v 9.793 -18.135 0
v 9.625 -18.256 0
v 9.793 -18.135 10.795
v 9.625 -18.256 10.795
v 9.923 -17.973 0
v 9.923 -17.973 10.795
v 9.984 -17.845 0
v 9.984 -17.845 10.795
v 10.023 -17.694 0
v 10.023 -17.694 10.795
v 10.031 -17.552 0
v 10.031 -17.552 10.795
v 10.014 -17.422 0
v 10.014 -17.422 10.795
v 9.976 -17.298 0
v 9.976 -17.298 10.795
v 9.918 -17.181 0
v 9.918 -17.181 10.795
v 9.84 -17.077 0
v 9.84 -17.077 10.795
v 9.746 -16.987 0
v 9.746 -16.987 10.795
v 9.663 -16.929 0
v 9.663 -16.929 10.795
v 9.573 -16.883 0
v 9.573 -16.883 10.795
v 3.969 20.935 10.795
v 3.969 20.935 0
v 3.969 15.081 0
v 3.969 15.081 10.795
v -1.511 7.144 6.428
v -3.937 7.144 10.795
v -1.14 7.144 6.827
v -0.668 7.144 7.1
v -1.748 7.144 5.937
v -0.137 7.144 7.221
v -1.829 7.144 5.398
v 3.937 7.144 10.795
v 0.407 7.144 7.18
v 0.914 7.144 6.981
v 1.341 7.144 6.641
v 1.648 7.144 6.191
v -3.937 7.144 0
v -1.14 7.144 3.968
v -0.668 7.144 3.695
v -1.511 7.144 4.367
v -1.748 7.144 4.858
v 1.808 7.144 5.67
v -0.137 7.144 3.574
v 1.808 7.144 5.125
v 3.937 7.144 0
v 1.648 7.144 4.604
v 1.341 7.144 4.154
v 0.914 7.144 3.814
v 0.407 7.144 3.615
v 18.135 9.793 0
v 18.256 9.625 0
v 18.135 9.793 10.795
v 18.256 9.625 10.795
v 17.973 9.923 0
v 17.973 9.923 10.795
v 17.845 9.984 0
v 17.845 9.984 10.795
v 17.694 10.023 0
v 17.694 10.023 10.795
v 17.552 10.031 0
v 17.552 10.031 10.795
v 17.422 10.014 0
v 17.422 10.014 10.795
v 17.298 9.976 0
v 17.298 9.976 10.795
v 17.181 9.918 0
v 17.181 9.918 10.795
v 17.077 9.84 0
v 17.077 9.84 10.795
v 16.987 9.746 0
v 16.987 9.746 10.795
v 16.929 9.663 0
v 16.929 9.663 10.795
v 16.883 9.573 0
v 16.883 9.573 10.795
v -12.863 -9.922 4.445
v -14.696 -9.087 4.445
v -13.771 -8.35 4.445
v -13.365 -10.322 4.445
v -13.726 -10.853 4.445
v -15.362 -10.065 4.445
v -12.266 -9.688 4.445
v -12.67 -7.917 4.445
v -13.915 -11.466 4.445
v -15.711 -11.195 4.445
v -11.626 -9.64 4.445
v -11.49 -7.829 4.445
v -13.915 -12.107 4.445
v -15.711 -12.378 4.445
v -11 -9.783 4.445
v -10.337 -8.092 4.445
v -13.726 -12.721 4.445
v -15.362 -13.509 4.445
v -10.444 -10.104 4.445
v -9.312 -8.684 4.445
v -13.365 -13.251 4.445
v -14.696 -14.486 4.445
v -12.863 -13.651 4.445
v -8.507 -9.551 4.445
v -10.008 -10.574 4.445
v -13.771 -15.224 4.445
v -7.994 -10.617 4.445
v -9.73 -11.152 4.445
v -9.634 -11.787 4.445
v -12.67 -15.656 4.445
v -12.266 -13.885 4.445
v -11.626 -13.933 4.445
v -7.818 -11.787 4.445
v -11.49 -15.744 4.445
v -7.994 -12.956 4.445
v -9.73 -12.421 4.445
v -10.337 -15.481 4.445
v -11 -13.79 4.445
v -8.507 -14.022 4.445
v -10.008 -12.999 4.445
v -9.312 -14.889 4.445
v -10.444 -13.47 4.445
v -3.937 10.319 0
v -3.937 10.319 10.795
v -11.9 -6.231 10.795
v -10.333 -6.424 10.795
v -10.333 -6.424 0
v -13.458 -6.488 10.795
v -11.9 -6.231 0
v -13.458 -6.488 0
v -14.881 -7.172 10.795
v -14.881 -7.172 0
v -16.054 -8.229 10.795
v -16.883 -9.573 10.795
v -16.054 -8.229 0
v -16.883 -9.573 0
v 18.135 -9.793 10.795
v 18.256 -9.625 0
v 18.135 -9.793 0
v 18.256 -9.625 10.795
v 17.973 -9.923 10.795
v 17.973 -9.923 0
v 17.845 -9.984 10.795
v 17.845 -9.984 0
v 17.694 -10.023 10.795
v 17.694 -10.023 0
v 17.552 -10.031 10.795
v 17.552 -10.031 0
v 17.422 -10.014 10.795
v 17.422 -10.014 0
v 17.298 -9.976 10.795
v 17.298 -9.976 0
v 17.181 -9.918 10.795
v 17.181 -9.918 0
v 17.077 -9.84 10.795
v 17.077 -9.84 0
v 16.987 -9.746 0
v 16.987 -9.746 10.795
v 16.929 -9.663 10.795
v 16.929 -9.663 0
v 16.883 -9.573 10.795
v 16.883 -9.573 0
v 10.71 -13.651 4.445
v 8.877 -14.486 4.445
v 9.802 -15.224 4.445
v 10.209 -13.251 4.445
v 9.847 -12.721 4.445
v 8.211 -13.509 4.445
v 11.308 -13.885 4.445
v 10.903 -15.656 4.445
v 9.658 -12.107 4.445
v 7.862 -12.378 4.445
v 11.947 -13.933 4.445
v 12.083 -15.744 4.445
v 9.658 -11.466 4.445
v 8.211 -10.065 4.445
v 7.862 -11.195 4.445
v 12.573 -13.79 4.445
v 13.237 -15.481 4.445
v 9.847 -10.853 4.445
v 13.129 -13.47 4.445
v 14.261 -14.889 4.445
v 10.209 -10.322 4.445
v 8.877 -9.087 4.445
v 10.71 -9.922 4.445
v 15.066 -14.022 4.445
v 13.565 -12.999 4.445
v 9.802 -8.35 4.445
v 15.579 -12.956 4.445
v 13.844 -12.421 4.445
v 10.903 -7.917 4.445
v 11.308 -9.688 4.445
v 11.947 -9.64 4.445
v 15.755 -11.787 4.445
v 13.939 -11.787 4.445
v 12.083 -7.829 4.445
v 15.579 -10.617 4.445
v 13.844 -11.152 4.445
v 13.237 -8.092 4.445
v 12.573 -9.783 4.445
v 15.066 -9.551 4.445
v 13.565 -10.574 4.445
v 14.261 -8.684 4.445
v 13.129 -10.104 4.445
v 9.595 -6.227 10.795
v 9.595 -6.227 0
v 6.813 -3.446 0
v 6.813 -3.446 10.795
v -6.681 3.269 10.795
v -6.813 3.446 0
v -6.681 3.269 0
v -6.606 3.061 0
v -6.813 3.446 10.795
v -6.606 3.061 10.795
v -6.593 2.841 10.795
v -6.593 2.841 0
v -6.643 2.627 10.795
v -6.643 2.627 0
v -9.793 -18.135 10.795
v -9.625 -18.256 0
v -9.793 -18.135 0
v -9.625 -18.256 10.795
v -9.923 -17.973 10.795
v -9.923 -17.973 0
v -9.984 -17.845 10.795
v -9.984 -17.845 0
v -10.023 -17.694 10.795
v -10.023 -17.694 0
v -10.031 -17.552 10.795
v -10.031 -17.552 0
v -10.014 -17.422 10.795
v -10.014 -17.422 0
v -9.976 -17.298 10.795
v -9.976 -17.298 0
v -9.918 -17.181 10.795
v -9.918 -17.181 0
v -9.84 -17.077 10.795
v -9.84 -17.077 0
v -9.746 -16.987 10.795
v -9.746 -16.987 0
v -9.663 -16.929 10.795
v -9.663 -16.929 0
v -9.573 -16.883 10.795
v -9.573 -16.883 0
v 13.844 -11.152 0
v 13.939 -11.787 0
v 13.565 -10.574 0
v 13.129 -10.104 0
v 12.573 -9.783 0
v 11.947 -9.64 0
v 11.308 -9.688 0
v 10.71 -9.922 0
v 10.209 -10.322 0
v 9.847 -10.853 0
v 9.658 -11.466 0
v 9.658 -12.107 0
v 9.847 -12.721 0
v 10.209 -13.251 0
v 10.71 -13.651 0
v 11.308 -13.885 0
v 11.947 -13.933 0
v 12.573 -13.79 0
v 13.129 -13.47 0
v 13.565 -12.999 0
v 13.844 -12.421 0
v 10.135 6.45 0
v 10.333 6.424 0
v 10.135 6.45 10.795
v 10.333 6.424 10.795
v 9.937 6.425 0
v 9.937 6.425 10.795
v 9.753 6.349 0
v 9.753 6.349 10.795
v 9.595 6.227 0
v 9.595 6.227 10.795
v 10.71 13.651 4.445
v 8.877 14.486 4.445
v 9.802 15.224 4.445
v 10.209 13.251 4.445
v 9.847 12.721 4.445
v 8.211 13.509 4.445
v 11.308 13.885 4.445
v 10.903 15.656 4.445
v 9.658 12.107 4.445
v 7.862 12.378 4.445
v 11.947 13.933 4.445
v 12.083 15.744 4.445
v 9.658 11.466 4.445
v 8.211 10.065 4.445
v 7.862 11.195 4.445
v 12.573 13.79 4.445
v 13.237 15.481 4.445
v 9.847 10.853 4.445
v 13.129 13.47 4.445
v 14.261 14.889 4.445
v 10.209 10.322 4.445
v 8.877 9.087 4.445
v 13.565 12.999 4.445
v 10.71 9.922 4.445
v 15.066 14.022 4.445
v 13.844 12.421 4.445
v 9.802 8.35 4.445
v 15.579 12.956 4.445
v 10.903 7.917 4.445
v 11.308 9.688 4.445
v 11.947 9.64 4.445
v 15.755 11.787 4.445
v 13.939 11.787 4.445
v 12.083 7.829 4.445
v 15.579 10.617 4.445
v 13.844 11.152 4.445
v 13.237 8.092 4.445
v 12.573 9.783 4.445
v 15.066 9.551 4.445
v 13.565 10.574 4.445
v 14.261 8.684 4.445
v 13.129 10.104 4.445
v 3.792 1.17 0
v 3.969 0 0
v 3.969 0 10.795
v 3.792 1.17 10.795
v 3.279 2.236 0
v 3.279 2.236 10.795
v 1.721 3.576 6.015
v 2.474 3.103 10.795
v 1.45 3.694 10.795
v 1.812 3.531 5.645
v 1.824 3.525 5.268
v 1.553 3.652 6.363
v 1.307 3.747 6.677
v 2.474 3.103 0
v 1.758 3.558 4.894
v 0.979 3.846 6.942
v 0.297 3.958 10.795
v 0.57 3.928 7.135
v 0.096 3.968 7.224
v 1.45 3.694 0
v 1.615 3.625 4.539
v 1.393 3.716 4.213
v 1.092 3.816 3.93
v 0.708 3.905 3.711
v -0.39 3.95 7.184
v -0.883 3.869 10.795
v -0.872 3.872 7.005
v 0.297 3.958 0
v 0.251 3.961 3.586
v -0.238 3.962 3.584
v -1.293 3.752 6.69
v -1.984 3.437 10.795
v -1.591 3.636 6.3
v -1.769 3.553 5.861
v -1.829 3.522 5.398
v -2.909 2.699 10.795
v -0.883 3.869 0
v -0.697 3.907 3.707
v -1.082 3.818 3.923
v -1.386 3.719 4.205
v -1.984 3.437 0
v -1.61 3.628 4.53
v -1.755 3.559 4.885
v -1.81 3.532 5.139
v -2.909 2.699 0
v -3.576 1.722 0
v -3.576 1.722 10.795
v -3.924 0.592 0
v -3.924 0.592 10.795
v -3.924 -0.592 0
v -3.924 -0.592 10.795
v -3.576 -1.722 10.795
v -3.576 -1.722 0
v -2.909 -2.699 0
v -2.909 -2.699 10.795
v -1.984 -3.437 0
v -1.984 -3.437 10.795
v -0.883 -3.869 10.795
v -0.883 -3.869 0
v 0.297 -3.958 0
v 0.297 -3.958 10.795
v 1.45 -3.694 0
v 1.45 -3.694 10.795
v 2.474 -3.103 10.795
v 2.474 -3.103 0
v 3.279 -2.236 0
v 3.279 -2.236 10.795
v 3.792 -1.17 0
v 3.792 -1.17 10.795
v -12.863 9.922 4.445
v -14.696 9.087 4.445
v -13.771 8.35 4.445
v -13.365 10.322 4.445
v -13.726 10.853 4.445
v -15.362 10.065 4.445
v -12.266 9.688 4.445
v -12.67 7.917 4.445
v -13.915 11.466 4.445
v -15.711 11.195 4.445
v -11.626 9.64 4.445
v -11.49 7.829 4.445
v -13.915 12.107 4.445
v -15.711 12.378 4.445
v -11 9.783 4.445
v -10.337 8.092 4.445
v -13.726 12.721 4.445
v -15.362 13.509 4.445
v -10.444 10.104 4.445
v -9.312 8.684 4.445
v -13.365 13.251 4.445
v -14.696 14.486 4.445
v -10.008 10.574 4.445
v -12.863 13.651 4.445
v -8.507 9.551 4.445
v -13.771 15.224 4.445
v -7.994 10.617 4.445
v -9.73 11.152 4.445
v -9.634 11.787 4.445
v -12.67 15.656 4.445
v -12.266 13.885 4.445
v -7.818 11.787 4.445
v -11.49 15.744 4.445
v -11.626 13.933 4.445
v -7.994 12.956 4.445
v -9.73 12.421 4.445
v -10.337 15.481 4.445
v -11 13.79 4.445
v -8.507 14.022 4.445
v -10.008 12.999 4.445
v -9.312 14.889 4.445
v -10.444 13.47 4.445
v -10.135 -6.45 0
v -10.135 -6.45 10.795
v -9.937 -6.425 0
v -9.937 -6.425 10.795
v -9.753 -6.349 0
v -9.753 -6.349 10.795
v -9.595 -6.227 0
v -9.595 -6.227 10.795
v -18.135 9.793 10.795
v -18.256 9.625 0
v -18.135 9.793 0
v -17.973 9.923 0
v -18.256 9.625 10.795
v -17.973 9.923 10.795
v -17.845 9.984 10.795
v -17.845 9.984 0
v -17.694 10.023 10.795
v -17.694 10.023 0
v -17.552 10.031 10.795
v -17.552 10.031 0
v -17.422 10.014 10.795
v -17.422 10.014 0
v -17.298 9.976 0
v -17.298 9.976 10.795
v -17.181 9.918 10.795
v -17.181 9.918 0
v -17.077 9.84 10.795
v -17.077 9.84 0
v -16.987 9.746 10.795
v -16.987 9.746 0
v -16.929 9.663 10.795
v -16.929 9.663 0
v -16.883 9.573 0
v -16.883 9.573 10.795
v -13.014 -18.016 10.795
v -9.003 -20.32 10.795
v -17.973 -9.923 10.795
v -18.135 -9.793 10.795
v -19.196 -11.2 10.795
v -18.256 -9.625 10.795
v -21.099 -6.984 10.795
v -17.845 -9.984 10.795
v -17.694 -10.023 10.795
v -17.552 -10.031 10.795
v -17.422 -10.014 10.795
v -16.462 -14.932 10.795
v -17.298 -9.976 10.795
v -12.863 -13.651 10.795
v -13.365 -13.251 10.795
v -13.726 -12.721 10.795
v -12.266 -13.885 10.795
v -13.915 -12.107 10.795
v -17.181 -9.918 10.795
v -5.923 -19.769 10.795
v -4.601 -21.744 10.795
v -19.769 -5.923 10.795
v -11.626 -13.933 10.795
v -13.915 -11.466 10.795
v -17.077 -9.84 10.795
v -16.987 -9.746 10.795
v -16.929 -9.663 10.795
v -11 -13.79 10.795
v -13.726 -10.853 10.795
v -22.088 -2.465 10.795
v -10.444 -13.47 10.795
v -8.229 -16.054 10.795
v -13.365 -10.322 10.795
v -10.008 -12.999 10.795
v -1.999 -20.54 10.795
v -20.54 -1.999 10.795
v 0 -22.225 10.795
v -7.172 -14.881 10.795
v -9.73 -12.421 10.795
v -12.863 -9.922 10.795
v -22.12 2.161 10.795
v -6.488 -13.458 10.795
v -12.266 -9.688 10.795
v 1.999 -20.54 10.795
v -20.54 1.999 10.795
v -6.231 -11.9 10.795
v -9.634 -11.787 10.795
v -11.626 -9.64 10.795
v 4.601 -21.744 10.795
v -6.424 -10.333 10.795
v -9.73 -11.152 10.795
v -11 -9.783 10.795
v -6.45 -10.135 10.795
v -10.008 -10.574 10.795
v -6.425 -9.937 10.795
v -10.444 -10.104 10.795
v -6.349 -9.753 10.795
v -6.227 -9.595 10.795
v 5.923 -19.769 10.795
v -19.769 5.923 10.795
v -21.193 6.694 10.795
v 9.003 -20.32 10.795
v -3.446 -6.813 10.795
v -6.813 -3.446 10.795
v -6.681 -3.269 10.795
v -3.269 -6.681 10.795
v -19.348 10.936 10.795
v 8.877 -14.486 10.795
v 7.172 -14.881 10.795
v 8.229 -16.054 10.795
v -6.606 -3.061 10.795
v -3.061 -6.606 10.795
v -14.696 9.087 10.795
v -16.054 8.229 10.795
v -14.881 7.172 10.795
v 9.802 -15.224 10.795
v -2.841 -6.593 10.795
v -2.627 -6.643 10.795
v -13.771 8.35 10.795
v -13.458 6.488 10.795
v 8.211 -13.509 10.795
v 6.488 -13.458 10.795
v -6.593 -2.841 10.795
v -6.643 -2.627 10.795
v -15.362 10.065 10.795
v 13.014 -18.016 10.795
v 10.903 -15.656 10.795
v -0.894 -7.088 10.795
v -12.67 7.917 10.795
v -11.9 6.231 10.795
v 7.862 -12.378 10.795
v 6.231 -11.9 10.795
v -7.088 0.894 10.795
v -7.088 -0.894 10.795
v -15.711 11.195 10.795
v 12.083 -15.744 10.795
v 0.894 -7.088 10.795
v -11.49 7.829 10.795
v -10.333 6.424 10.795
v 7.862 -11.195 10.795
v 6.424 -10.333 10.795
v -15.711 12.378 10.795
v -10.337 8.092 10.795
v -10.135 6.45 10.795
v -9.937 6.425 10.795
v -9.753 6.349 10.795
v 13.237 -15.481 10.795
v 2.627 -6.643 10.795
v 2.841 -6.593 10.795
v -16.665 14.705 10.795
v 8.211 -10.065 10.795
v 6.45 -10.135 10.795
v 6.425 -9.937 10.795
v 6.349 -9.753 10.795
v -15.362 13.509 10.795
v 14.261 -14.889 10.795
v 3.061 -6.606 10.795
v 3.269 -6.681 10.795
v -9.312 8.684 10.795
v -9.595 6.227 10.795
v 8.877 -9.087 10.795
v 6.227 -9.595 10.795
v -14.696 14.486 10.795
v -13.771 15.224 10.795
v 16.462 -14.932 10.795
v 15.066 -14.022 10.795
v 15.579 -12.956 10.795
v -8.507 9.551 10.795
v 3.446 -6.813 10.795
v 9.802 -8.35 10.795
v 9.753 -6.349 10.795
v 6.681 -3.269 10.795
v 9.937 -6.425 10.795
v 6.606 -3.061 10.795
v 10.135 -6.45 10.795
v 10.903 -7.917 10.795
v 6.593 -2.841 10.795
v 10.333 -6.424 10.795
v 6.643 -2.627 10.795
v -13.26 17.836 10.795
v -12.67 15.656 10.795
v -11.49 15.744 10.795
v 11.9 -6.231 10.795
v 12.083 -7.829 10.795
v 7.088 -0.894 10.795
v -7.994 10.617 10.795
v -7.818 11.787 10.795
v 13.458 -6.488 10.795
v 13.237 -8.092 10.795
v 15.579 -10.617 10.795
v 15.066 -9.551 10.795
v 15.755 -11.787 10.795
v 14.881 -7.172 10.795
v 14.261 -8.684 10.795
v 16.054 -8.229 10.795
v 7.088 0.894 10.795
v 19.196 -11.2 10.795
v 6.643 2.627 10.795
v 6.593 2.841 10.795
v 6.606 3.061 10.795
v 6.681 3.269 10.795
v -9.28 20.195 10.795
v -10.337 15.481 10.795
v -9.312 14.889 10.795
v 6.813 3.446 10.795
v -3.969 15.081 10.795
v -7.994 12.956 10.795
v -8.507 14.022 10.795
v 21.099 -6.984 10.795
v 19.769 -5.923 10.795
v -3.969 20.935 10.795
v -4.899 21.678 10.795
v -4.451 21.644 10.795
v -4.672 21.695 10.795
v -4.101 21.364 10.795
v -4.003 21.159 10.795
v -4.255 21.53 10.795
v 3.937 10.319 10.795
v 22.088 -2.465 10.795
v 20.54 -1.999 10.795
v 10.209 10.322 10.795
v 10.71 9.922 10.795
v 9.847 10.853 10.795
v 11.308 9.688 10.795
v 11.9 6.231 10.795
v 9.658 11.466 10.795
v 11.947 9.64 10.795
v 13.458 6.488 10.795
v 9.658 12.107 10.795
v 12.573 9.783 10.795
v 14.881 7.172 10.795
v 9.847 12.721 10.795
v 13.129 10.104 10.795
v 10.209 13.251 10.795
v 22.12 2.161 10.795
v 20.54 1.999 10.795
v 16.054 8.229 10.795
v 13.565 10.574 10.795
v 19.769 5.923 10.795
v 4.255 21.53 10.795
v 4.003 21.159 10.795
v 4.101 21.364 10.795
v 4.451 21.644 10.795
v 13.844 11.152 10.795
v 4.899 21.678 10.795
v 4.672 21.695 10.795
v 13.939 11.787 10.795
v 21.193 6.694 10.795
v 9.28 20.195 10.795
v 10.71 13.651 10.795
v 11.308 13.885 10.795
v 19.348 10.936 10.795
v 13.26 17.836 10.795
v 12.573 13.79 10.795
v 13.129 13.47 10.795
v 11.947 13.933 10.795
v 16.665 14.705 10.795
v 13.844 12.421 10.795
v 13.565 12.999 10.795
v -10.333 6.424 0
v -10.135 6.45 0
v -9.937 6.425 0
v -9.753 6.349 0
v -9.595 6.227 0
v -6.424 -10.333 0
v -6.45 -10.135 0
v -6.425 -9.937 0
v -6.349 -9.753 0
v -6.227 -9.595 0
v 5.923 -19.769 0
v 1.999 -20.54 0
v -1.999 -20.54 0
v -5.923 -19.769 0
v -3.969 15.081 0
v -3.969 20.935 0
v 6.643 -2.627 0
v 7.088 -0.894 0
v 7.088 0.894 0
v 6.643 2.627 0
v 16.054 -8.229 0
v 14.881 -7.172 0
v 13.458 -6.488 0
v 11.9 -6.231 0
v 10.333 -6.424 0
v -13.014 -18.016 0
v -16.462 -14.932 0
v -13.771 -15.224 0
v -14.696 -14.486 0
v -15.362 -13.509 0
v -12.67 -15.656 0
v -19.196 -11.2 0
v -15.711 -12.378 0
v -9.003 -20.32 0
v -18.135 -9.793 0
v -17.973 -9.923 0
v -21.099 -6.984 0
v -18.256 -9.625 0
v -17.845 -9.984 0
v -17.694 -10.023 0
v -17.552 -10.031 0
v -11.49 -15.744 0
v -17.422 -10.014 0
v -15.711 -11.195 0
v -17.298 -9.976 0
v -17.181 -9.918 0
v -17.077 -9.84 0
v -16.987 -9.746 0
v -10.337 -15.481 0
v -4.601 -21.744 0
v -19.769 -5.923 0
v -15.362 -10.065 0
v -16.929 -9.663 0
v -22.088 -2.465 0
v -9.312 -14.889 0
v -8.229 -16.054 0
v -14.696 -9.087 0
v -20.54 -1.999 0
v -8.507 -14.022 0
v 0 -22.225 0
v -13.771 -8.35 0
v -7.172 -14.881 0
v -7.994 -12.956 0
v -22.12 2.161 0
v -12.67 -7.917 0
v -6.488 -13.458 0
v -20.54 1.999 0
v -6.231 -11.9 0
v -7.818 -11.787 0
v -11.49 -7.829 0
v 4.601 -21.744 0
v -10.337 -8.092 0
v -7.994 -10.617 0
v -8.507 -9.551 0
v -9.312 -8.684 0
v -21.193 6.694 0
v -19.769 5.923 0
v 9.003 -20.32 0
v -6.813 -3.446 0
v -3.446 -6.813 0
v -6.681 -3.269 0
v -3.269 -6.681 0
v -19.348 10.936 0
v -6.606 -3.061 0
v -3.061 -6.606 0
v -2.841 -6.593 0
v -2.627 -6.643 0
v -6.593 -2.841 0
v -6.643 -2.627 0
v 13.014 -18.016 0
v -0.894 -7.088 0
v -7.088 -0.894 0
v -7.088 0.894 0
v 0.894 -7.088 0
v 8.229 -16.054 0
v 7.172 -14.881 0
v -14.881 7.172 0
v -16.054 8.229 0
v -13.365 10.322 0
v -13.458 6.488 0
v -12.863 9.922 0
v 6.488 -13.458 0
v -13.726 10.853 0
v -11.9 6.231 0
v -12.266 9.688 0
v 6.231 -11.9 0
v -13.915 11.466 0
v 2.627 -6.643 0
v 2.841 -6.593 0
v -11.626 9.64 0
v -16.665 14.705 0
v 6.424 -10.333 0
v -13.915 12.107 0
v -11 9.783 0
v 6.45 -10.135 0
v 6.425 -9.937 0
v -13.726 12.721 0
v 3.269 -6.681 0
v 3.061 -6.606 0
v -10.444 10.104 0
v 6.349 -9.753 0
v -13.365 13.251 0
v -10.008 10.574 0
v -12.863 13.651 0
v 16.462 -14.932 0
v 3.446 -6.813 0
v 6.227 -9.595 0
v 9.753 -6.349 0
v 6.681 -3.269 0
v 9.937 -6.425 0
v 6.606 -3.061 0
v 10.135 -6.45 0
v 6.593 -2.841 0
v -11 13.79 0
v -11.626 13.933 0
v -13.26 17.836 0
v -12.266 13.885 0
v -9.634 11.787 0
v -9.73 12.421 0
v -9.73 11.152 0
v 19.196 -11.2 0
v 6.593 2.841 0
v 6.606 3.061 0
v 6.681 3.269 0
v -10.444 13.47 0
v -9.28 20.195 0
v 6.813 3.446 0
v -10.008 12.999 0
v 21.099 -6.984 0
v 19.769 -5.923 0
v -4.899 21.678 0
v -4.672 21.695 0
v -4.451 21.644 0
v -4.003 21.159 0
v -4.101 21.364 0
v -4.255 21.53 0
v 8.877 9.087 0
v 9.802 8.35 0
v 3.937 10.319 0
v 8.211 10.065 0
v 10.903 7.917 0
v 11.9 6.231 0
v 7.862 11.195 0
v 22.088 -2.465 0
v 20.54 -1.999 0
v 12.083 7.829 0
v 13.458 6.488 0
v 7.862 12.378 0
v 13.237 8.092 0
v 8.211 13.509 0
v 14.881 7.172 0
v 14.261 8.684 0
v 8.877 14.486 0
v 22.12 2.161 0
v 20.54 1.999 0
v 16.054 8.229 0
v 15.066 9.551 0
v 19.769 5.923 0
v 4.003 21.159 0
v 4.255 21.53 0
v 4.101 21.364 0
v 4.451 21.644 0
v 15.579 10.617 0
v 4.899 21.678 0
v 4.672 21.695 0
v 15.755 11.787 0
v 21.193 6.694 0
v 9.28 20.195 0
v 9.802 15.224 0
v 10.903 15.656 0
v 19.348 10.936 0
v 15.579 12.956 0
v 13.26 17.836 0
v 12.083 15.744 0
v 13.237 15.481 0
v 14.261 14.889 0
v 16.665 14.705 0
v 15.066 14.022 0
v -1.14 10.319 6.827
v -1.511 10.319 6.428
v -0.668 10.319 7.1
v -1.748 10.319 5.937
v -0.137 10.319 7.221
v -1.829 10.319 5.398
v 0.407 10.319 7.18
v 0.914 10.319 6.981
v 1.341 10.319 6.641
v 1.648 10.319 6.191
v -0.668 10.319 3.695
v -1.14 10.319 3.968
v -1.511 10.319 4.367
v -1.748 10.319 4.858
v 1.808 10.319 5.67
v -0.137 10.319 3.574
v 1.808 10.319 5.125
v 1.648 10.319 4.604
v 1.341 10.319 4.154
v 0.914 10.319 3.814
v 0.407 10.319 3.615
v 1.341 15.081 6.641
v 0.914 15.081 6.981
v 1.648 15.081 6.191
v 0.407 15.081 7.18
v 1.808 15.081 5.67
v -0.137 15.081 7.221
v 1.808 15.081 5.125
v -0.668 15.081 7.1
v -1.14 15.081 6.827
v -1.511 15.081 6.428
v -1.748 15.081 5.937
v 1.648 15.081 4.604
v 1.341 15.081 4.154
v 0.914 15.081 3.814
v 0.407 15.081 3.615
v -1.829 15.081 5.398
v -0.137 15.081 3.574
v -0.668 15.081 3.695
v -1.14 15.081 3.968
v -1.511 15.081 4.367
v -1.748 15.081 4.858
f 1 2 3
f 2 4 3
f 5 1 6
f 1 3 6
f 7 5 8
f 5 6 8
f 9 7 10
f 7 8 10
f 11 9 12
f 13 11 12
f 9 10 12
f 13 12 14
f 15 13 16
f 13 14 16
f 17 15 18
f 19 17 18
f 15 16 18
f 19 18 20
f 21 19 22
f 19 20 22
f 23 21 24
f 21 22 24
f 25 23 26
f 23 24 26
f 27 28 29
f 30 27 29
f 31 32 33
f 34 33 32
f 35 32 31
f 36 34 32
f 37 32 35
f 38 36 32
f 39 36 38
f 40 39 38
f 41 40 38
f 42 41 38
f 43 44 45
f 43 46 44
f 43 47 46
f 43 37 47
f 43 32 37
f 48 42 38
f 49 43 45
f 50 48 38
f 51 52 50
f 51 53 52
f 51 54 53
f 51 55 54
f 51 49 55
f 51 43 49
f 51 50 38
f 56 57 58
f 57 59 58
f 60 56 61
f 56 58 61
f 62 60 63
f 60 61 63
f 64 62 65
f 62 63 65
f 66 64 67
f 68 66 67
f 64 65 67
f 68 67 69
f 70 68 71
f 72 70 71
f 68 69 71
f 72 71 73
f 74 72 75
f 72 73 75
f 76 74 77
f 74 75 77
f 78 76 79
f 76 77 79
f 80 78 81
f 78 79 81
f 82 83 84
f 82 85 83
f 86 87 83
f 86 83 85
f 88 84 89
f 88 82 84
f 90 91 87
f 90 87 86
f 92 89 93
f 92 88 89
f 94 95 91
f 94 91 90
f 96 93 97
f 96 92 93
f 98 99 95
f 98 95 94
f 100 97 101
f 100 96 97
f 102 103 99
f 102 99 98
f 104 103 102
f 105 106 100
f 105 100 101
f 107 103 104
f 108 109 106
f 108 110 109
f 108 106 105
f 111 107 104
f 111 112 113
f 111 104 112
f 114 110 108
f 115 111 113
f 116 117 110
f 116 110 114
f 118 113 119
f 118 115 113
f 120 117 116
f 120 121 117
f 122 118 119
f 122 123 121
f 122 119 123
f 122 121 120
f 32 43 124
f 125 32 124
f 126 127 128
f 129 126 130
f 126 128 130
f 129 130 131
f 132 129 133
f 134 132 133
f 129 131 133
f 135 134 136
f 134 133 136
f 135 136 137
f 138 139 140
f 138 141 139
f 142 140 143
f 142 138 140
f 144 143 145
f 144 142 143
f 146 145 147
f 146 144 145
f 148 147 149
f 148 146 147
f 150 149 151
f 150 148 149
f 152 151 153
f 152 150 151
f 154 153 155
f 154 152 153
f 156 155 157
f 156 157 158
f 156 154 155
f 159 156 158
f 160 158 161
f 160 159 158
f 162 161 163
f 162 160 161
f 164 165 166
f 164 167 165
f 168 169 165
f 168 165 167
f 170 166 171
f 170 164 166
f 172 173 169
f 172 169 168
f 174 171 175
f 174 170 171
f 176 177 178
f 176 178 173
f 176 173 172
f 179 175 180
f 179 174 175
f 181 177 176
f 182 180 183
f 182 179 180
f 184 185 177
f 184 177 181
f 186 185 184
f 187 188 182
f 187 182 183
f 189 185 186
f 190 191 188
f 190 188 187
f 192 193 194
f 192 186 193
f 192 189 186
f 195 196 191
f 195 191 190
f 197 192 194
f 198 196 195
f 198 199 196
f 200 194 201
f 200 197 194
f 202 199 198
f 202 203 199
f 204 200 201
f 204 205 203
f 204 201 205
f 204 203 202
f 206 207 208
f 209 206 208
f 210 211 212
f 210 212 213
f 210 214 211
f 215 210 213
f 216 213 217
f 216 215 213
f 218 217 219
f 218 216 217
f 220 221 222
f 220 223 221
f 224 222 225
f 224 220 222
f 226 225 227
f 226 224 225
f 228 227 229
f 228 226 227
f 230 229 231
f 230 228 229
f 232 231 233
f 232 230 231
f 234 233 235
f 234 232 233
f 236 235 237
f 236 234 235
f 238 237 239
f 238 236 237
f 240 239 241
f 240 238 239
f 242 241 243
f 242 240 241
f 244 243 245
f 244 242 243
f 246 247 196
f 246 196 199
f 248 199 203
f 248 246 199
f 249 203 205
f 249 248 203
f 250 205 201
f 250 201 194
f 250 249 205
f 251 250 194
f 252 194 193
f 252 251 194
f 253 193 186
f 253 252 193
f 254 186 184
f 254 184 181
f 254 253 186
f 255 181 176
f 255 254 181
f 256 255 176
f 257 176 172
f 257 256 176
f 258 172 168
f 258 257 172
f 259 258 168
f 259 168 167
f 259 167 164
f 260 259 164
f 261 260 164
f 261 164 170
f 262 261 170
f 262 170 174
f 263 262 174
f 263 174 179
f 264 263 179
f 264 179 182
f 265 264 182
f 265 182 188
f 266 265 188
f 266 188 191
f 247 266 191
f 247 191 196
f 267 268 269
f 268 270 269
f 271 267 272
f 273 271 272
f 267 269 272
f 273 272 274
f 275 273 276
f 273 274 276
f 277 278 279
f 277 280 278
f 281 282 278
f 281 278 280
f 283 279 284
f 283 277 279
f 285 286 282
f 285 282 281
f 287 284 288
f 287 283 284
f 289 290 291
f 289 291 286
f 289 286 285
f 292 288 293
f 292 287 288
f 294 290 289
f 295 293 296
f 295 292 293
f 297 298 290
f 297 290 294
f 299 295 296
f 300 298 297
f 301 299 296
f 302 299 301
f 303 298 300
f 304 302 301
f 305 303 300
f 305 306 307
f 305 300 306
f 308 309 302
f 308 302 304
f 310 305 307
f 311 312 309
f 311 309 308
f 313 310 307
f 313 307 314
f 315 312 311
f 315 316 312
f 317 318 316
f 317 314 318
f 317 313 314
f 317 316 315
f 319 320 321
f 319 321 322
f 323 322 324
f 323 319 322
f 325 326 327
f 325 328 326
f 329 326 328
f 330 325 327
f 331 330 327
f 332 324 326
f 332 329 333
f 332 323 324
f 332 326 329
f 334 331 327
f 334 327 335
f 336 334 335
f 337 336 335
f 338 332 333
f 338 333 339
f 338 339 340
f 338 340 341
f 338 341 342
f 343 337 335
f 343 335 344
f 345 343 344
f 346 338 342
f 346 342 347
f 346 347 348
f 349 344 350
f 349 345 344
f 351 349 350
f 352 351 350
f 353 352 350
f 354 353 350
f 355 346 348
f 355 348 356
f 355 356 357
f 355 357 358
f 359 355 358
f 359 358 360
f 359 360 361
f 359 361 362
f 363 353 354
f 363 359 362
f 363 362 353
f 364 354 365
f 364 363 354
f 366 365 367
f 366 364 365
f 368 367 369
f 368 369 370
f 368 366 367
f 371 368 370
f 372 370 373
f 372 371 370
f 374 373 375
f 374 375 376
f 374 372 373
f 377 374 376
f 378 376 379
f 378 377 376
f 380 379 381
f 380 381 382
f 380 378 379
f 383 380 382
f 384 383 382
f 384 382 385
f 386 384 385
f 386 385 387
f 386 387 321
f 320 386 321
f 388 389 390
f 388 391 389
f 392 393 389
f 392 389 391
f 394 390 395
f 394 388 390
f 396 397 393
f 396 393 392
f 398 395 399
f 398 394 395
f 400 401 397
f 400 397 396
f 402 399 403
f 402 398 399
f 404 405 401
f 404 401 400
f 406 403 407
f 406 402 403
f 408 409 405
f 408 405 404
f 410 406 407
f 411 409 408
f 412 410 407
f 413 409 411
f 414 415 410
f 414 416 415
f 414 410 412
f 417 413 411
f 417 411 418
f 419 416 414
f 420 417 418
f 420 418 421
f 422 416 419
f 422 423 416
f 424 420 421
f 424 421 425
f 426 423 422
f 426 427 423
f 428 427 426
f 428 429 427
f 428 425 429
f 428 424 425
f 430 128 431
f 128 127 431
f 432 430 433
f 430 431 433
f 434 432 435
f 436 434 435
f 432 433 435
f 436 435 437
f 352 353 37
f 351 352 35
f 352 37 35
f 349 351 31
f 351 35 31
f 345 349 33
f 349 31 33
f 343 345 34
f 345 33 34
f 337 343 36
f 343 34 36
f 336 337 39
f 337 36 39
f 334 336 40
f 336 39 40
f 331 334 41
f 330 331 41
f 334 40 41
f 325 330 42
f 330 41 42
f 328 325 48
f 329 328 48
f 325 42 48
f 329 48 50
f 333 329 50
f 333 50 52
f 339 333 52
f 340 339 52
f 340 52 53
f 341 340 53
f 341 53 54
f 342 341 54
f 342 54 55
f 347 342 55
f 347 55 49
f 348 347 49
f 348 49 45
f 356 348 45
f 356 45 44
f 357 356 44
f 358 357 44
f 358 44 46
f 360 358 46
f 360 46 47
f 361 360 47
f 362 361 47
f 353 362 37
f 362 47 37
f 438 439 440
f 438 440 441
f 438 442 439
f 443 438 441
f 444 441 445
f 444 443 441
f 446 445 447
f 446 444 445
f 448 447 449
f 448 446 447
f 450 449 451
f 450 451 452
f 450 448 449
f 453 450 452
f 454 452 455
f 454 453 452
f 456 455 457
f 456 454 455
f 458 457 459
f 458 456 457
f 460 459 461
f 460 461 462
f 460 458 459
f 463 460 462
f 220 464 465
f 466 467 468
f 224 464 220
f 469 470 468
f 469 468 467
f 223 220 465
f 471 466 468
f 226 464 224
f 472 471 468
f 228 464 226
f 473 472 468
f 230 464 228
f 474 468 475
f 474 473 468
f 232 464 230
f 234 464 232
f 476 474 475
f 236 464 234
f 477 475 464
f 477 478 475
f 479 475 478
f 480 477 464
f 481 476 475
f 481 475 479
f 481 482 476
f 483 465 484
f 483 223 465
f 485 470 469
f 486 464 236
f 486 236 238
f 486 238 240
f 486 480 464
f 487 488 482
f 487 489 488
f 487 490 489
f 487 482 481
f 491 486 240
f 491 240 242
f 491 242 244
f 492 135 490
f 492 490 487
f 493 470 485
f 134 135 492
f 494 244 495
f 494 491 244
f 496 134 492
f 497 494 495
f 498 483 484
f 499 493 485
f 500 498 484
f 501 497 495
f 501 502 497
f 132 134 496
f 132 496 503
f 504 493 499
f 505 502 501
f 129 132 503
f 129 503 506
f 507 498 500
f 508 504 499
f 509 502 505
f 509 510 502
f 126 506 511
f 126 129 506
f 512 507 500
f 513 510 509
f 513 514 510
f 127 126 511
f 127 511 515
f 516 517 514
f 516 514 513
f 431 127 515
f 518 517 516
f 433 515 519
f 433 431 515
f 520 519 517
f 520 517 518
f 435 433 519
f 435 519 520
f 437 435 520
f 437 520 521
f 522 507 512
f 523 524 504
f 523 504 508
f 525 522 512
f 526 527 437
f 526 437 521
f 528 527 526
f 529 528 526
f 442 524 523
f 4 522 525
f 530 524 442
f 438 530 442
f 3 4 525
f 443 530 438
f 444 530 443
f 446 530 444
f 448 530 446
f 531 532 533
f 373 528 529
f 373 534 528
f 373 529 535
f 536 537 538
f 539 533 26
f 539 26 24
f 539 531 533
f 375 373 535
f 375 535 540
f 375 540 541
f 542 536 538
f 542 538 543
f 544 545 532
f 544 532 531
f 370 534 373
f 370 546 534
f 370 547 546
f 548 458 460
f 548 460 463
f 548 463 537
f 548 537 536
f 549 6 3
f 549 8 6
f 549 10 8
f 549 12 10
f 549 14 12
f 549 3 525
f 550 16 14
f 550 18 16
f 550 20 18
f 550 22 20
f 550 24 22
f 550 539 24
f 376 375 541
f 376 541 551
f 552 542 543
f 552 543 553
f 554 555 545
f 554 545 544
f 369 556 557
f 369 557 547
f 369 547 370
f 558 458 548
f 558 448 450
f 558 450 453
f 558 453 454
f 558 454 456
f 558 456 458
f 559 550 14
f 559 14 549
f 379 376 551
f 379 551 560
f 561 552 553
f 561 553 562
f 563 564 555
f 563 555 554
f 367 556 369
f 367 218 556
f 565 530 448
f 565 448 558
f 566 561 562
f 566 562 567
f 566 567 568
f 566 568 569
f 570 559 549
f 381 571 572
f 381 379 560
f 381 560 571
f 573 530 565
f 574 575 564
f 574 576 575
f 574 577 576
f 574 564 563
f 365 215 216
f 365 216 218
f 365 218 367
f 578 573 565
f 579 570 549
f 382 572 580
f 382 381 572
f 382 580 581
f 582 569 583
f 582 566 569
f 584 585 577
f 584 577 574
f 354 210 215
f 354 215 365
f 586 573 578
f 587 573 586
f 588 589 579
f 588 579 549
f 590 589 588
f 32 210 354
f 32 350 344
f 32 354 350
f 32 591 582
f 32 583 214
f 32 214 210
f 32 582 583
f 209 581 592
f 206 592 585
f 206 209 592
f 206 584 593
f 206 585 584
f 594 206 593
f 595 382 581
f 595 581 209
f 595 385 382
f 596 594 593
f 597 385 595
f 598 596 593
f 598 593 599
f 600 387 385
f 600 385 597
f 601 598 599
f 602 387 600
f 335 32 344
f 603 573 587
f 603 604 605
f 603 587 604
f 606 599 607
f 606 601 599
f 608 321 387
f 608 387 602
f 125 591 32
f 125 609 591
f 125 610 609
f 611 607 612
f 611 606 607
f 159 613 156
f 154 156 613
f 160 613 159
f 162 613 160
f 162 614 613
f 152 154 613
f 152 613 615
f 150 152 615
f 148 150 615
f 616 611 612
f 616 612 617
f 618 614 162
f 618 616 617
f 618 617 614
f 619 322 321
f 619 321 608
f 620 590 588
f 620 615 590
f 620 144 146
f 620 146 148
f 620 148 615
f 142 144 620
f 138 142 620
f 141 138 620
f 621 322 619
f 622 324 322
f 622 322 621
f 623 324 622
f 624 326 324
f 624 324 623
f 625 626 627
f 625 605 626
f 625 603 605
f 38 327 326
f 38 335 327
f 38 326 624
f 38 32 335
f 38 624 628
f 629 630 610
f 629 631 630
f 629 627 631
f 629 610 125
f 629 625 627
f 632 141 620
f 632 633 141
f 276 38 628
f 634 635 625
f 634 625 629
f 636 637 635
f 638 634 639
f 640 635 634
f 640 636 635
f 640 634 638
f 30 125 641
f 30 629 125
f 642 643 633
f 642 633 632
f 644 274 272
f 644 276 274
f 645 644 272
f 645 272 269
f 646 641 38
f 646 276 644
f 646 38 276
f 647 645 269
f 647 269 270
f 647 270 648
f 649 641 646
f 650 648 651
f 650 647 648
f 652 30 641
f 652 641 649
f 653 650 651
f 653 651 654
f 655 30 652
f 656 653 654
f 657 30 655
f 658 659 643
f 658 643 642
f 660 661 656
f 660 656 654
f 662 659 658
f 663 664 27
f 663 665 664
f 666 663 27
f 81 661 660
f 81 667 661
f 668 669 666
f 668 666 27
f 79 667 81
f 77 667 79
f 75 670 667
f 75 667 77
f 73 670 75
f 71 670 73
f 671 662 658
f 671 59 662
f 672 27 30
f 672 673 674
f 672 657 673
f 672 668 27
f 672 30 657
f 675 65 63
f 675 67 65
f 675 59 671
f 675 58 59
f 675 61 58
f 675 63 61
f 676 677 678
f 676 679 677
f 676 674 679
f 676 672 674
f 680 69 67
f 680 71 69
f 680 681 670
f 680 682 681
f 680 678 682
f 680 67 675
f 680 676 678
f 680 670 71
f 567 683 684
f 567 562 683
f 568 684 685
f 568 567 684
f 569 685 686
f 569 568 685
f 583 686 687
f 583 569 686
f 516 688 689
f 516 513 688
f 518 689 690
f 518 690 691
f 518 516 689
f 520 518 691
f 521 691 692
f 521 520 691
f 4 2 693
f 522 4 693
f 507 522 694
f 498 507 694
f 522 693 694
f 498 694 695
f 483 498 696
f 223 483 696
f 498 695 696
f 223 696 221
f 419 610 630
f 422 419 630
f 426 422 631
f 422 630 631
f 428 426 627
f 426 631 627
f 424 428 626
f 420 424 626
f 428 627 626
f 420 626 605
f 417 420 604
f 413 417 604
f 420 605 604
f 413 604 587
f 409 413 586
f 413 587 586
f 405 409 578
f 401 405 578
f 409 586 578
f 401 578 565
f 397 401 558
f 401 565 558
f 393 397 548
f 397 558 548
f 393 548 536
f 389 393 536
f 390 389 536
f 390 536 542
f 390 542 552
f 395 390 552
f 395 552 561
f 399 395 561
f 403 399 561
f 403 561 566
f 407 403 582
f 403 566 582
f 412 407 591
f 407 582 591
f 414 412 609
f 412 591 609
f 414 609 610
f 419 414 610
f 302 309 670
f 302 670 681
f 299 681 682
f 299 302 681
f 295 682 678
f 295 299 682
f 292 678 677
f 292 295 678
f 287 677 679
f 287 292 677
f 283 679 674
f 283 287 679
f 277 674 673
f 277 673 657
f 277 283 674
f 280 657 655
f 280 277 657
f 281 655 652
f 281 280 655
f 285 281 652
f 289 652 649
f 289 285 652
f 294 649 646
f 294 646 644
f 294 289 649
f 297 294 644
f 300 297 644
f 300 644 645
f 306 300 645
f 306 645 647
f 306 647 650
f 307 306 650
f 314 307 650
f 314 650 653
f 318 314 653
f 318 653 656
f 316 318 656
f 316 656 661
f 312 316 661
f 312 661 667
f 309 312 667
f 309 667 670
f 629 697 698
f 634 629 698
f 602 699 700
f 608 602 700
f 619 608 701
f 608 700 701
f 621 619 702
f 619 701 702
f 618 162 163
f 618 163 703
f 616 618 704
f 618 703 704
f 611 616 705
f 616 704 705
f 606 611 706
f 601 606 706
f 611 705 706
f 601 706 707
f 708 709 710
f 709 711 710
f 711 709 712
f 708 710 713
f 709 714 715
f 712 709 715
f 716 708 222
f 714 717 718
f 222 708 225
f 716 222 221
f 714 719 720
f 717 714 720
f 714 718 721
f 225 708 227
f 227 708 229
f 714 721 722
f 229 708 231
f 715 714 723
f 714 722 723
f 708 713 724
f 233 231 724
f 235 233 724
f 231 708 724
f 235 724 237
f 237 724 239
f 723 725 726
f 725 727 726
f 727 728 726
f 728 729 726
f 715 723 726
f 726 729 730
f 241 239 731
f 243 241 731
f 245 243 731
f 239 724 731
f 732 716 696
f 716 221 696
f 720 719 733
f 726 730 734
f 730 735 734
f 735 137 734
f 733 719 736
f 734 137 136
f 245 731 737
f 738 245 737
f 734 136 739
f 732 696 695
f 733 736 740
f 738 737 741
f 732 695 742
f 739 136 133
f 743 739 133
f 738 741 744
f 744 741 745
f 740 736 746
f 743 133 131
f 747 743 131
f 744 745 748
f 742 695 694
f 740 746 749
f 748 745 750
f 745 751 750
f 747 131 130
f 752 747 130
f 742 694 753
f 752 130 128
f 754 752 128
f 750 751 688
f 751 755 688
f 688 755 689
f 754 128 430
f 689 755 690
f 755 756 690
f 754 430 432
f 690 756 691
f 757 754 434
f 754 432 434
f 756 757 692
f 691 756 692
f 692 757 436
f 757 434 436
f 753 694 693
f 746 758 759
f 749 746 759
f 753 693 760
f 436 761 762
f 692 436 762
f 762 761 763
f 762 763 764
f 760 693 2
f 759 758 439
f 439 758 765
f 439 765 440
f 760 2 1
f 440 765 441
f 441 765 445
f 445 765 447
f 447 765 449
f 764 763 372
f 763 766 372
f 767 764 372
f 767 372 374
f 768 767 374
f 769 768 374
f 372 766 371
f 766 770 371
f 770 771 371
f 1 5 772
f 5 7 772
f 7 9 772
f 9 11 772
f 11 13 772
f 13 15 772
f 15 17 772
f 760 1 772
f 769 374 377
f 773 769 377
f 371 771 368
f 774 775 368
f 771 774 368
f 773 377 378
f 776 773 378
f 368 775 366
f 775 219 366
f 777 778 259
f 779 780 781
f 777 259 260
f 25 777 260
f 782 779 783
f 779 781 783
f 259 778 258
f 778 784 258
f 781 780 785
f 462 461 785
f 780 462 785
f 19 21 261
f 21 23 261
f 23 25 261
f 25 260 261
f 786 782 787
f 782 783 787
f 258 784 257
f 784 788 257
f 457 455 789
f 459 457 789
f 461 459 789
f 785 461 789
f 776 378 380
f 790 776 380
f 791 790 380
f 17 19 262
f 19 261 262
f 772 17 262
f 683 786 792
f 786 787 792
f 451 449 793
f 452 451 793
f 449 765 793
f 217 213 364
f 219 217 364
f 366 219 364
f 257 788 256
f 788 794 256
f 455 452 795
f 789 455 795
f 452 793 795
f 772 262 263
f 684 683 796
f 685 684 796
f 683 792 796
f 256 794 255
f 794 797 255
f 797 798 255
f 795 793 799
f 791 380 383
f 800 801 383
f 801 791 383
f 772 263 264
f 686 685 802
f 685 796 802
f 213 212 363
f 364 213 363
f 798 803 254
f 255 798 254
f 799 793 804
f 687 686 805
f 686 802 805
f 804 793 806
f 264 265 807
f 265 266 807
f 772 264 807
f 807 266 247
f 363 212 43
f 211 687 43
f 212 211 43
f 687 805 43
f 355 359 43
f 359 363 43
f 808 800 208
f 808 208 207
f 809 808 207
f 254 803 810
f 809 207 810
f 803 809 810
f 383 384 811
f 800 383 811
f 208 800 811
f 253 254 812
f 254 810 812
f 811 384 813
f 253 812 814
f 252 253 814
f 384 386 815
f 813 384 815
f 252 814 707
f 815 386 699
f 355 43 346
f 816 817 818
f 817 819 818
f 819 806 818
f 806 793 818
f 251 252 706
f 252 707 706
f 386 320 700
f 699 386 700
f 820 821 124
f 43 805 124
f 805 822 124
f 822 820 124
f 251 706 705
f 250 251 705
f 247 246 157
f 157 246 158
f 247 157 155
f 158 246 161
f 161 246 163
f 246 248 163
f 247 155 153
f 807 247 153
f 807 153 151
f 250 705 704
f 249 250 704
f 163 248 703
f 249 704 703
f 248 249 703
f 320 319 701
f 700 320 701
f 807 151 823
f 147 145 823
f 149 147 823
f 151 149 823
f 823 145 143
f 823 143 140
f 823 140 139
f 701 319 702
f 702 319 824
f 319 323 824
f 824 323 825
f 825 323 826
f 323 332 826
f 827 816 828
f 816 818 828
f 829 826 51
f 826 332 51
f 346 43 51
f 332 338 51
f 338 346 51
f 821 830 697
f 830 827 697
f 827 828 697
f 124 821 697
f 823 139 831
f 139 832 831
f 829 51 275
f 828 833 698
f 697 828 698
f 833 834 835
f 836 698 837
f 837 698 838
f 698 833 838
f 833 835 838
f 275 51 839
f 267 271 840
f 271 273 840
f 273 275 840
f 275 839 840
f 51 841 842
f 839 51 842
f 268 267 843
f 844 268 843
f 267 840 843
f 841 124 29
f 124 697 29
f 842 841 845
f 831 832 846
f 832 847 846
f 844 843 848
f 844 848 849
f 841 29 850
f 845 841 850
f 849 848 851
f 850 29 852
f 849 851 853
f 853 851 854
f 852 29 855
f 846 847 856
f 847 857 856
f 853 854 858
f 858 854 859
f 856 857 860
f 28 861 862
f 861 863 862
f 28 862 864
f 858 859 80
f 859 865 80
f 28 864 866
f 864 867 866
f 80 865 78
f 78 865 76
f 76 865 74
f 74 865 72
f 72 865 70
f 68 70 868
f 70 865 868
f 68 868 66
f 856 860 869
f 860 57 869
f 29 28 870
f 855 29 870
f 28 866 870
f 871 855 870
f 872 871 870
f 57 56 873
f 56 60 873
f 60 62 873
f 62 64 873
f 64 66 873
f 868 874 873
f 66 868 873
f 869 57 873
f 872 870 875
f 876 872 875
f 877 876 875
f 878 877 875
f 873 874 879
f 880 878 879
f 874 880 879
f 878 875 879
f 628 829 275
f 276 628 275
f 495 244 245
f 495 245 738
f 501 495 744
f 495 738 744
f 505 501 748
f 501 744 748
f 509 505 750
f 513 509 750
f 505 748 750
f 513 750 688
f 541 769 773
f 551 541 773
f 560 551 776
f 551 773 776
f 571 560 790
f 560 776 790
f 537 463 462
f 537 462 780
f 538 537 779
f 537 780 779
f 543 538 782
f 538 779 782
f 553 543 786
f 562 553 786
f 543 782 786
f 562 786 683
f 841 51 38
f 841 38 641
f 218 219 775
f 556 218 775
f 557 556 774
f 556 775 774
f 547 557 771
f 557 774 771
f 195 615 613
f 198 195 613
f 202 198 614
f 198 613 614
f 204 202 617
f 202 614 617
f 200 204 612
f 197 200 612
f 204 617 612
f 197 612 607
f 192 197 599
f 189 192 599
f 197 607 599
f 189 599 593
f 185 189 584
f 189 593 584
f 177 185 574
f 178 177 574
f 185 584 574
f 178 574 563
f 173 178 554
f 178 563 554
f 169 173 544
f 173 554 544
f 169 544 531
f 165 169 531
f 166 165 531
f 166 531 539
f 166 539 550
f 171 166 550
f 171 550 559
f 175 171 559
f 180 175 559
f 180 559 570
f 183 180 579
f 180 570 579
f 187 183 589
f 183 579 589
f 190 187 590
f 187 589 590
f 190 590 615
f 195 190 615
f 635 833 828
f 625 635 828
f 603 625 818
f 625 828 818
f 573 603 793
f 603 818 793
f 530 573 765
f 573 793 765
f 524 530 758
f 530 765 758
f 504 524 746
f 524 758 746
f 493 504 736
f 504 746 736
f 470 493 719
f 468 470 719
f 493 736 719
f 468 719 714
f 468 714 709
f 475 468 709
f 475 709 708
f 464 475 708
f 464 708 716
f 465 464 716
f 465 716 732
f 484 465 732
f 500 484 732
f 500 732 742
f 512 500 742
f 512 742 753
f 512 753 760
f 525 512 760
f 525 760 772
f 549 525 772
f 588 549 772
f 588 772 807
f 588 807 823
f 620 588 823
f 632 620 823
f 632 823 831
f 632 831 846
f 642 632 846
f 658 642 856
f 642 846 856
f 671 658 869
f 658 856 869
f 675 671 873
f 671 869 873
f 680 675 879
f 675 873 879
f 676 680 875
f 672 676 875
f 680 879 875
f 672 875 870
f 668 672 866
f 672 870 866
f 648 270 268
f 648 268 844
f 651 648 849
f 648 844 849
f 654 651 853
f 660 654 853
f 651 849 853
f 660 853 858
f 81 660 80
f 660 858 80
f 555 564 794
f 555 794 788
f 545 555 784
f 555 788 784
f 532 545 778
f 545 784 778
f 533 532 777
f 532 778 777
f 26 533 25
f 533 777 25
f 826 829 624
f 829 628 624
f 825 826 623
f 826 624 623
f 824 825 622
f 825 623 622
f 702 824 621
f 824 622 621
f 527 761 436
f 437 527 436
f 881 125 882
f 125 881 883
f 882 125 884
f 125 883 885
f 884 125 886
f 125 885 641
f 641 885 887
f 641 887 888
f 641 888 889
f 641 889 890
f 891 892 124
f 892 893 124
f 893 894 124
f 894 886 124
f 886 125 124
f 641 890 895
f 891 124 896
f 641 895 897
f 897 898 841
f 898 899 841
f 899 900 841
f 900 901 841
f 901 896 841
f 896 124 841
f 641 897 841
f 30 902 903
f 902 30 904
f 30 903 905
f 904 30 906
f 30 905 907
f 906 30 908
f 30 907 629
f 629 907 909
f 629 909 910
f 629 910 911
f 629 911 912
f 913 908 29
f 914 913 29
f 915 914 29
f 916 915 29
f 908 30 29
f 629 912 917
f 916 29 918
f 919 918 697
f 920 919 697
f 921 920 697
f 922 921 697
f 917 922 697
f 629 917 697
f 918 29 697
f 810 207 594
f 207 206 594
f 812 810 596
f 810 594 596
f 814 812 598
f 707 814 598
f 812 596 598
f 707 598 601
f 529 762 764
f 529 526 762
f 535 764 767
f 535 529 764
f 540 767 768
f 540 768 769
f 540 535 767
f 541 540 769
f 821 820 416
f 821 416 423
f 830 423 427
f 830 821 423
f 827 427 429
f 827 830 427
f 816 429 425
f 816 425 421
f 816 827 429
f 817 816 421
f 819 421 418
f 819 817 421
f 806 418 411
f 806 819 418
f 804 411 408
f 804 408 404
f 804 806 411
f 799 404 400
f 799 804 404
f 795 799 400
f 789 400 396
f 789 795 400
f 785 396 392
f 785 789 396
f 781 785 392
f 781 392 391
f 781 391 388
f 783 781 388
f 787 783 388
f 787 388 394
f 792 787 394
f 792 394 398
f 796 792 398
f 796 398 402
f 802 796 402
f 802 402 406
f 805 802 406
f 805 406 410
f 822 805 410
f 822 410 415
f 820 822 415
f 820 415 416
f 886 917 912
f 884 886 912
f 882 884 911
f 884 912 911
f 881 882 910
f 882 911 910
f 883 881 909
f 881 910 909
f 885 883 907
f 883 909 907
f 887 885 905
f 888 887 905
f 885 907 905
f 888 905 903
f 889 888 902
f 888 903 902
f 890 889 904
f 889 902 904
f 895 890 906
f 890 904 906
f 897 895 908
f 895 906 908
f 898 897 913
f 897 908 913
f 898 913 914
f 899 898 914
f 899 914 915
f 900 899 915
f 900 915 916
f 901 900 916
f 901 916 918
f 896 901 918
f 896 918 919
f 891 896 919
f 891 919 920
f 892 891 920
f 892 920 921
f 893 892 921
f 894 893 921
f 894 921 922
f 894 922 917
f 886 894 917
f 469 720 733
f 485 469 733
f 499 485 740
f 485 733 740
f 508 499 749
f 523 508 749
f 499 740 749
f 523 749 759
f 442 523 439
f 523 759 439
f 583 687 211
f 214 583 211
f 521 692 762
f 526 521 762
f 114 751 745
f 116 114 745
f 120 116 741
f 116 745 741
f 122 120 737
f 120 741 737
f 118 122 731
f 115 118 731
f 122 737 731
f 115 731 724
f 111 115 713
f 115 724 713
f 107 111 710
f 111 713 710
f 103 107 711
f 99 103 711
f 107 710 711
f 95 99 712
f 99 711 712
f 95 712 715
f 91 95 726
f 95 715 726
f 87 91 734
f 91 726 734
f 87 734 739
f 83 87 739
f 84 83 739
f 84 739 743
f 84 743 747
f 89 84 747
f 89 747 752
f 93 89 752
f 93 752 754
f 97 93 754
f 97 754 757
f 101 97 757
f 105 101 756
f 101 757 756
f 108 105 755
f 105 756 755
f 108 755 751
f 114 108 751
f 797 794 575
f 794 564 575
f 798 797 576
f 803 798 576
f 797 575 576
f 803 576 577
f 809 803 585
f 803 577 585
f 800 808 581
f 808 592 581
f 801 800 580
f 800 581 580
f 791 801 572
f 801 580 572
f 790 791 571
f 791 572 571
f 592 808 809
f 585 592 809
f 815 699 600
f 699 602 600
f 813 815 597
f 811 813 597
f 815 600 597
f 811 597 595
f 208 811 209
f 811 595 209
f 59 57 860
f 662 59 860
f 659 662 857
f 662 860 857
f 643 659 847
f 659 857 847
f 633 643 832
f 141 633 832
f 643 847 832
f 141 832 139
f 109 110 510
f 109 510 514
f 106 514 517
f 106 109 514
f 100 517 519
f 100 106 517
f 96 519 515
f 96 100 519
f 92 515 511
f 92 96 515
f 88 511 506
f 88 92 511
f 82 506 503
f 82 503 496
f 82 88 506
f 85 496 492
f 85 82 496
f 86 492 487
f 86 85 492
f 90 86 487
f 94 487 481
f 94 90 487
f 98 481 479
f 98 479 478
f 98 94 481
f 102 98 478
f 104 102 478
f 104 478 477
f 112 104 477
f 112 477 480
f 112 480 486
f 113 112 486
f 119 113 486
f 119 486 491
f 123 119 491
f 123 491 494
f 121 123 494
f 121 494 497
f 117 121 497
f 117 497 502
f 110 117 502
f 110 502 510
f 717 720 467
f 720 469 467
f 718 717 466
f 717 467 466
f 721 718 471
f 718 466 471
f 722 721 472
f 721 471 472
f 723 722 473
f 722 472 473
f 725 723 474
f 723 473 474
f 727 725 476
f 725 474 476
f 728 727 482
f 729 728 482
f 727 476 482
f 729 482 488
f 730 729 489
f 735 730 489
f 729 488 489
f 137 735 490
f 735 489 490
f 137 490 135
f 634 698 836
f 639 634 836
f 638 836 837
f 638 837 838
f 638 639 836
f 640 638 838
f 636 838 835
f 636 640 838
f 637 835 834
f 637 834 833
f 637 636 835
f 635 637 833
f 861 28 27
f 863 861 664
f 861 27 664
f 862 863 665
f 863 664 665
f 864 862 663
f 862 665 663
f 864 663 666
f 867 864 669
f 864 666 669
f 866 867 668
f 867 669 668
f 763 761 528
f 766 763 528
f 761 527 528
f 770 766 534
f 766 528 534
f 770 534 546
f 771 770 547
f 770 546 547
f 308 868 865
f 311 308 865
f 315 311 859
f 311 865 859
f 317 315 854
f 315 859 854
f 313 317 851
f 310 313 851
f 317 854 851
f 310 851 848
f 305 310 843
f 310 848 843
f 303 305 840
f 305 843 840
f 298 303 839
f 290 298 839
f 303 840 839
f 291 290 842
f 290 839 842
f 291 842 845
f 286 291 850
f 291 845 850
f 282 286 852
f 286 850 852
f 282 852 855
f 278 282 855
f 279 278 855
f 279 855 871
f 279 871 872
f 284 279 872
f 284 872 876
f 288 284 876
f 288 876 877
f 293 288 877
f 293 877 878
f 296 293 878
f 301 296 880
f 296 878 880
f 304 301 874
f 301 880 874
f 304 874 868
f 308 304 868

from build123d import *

# Parameters (mm, degrees)
F0_R            = 2.15265
F0_R_2          = 3.96875
F0_W            = 7.874
F0_H            = 3.175
F1_DEPTH        = 10.795
F2_R            = 1.8288
F3_REACH        = 42.4798775257
F5_R            = 3.96875
F6_DEPTH        = 4.445
F8_DEPTH        = 10.795
F8_COPIES_COUNT = 3
F8_COPIES_ANGLE = 180
F9_R            = 0.762
F11_R           = 3.96875
F11_R_2         = 2.15265
F13_DEPTH       = 6.35


# Not quite as in the source:
# - a feature of the source that left no trace in its solid (it failed there, or was rolled back) is left out
# - a pattern or mirror of a feature is missing from the dataset's text; its kind, count and spacing are read off the source's solid


with BuildPart() as f1:
    # F0 (on Top) → F1 (new body)
    with BuildSketch(Plane.XY):
        with BuildLine():
            Line((3.96875, 15.08125), (-3.96875, 15.08125))
            Line((-3.96875, 15.08125), (-3.96875, 21.8677764859))
            ThreePointArc((-3.96875, 21.8677764859), (0, -22.225), (3.96875, 21.8677764859))
            Line((3.96875, 21.8677764859), (3.96875, 15.08125))
        make_face()
        with Locations((-11.7865861589, -11.7865861589)):
            Circle(F0_R, mode=Mode.SUBTRACT)
        with Locations((11.7865861589, -11.7865861589)):
            Circle(F0_R, mode=Mode.SUBTRACT)
        with Locations((-11.7865861589, 11.7865861589)):
            Circle(F0_R, mode=Mode.SUBTRACT)
        Circle(F0_R_2, mode=Mode.SUBTRACT)
        with Locations((0, 8.73125)):
            Rectangle(F0_W, F0_H, mode=Mode.SUBTRACT)
        with Locations((11.7865861589, 11.7865861589)):
            Circle(F0_R, mode=Mode.SUBTRACT)
    extrude(amount=F1_DEPTH)

    f3_end = f1.faces().sort_by_distance((-3.96875, 0, 5.3975))[0]
    # F2 (on face) → F3 (cut, up to a face of the model that its end follows)
    with BuildSketch(Plane(origin=(0, 15.08125, 0), x_dir=(-1, 0, 0), z_dir=(0, 1, 0))):
        with Locations((0, 5.3975)):
            Circle(F2_R)
    f3_long = extrude(amount=-F3_REACH, mode=Mode.PRIVATE)
    add(split(f3_long, bisect_by=f3_end, keep=Keep.ALL, mode=Mode.PRIVATE).solids().sort_by_distance((0, 15.08125, 5.3975))[0], mode=Mode.SUBTRACT)

    # F5 (on face) → F6 (cut, through all)
    with BuildSketch(Plane(origin=(0, 0, 0), x_dir=(1, 0, 0), z_dir=(0, 0, -1))):
        with Locations((11.7865861589, -11.7865861589)):
            Circle(F5_R)
        with Locations((-11.7865861589, 11.7865861589)):
            Circle(F5_R)
    extrude(amount=-F6_DEPTH, mode=Mode.SUBTRACT)

    # F7 (on face) → F8 (cut, through all)
    with BuildSketch(Plane(origin=(0, 0, 0), x_dir=(1, 0, 0), z_dir=(0, 0, -1))):
        with BuildLine():
            ThreePointArc((-17.3148424047, -11.229543123), (-14.7565267097, -7.0906978311), (-9.9206262673, -6.5530302219))
            Line((-9.9206262673, -6.5530302219), (-6.4462980227, -3.0787019773))
            ThreePointArc((-6.4462980227, -3.0787019773), (-7.14375, 0), (-6.4462980227, 3.0787019773))
            Line((-6.4462980227, 3.0787019773), (-9.9206262673, 6.5530302219))
            ThreePointArc((-9.9206262673, 6.5530302219), (-14.7565267097, 7.0906978311), (-17.3148424047, 11.229543123))
            ThreePointArc((-17.3148424047, 11.229543123), (-20.6375, 0), (-17.3148424047, -11.229543123))
        make_face()
    f8 = extrude(amount=-F8_DEPTH, mode=Mode.SUBTRACT)

    # F8_copies: F8 ×3 about axis
    f8_copies_axis = Axis((0, 0, 0), (0, 0, 1))
    for i in range(1, F8_COPIES_COUNT):
        add(f8.rotate(f8_copies_axis, i * F8_COPIES_ANGLE / (F8_COPIES_COUNT - 1)), mode=Mode.SUBTRACT)

    # F9
    f9_edges = [f1.edges().sort_by_distance(p)[0] for p in [
        (-17.314842, -11.229543, 5.3975),
        (-9.920626, -6.55303, 5.3975),
        (-6.446298, -3.078702, 5.3975),
        (-6.446298, 3.078702, 5.3975),
        (-9.920626, 6.55303, 5.3975),
        (-17.314842, 11.229543, 5.3975),
        (3.96875, 21.867776, 5.3975),
        (-3.96875, 21.867776, 5.3975),
        (11.229543, -17.314842, 5.3975),
        (-11.229543, -17.314842, 5.3975),
        (6.55303, -9.920626, 5.3975),
        (-6.55303, -9.920626, 5.3975),
        (3.078702, -6.446298, 5.3975),
        (-3.078702, -6.446298, 5.3975),
        (17.314842, 11.229543, 5.3975),
        (17.314842, -11.229543, 5.3975),
        (9.920626, 6.55303, 5.3975),
        (6.446298, 3.078702, 5.3975),
        (6.446298, -3.078702, 5.3975),
        (9.920626, -6.55303, 5.3975),
    ]]
    fillet(f9_edges, radius=F9_R)

    # F11 (on face) → F13 (cut, through all)
    with BuildSketch(Plane.XY.offset(10.795)):
        with Locations((-11.7865861589, 11.7865861589)):
            Circle(F11_R)
        with Locations((-11.7865861589, 11.7865861589)):
            Circle(F11_R_2, mode=Mode.SUBTRACT)
        with Locations((11.7865861589, -11.7865861589)):
            Circle(F11_R)
        with Locations((11.7865861589, -11.7865861589)):
            Circle(F11_R_2, mode=Mode.SUBTRACT)
    extrude(amount=-F13_DEPTH, mode=Mode.SUBTRACT)


solid = f1.part
